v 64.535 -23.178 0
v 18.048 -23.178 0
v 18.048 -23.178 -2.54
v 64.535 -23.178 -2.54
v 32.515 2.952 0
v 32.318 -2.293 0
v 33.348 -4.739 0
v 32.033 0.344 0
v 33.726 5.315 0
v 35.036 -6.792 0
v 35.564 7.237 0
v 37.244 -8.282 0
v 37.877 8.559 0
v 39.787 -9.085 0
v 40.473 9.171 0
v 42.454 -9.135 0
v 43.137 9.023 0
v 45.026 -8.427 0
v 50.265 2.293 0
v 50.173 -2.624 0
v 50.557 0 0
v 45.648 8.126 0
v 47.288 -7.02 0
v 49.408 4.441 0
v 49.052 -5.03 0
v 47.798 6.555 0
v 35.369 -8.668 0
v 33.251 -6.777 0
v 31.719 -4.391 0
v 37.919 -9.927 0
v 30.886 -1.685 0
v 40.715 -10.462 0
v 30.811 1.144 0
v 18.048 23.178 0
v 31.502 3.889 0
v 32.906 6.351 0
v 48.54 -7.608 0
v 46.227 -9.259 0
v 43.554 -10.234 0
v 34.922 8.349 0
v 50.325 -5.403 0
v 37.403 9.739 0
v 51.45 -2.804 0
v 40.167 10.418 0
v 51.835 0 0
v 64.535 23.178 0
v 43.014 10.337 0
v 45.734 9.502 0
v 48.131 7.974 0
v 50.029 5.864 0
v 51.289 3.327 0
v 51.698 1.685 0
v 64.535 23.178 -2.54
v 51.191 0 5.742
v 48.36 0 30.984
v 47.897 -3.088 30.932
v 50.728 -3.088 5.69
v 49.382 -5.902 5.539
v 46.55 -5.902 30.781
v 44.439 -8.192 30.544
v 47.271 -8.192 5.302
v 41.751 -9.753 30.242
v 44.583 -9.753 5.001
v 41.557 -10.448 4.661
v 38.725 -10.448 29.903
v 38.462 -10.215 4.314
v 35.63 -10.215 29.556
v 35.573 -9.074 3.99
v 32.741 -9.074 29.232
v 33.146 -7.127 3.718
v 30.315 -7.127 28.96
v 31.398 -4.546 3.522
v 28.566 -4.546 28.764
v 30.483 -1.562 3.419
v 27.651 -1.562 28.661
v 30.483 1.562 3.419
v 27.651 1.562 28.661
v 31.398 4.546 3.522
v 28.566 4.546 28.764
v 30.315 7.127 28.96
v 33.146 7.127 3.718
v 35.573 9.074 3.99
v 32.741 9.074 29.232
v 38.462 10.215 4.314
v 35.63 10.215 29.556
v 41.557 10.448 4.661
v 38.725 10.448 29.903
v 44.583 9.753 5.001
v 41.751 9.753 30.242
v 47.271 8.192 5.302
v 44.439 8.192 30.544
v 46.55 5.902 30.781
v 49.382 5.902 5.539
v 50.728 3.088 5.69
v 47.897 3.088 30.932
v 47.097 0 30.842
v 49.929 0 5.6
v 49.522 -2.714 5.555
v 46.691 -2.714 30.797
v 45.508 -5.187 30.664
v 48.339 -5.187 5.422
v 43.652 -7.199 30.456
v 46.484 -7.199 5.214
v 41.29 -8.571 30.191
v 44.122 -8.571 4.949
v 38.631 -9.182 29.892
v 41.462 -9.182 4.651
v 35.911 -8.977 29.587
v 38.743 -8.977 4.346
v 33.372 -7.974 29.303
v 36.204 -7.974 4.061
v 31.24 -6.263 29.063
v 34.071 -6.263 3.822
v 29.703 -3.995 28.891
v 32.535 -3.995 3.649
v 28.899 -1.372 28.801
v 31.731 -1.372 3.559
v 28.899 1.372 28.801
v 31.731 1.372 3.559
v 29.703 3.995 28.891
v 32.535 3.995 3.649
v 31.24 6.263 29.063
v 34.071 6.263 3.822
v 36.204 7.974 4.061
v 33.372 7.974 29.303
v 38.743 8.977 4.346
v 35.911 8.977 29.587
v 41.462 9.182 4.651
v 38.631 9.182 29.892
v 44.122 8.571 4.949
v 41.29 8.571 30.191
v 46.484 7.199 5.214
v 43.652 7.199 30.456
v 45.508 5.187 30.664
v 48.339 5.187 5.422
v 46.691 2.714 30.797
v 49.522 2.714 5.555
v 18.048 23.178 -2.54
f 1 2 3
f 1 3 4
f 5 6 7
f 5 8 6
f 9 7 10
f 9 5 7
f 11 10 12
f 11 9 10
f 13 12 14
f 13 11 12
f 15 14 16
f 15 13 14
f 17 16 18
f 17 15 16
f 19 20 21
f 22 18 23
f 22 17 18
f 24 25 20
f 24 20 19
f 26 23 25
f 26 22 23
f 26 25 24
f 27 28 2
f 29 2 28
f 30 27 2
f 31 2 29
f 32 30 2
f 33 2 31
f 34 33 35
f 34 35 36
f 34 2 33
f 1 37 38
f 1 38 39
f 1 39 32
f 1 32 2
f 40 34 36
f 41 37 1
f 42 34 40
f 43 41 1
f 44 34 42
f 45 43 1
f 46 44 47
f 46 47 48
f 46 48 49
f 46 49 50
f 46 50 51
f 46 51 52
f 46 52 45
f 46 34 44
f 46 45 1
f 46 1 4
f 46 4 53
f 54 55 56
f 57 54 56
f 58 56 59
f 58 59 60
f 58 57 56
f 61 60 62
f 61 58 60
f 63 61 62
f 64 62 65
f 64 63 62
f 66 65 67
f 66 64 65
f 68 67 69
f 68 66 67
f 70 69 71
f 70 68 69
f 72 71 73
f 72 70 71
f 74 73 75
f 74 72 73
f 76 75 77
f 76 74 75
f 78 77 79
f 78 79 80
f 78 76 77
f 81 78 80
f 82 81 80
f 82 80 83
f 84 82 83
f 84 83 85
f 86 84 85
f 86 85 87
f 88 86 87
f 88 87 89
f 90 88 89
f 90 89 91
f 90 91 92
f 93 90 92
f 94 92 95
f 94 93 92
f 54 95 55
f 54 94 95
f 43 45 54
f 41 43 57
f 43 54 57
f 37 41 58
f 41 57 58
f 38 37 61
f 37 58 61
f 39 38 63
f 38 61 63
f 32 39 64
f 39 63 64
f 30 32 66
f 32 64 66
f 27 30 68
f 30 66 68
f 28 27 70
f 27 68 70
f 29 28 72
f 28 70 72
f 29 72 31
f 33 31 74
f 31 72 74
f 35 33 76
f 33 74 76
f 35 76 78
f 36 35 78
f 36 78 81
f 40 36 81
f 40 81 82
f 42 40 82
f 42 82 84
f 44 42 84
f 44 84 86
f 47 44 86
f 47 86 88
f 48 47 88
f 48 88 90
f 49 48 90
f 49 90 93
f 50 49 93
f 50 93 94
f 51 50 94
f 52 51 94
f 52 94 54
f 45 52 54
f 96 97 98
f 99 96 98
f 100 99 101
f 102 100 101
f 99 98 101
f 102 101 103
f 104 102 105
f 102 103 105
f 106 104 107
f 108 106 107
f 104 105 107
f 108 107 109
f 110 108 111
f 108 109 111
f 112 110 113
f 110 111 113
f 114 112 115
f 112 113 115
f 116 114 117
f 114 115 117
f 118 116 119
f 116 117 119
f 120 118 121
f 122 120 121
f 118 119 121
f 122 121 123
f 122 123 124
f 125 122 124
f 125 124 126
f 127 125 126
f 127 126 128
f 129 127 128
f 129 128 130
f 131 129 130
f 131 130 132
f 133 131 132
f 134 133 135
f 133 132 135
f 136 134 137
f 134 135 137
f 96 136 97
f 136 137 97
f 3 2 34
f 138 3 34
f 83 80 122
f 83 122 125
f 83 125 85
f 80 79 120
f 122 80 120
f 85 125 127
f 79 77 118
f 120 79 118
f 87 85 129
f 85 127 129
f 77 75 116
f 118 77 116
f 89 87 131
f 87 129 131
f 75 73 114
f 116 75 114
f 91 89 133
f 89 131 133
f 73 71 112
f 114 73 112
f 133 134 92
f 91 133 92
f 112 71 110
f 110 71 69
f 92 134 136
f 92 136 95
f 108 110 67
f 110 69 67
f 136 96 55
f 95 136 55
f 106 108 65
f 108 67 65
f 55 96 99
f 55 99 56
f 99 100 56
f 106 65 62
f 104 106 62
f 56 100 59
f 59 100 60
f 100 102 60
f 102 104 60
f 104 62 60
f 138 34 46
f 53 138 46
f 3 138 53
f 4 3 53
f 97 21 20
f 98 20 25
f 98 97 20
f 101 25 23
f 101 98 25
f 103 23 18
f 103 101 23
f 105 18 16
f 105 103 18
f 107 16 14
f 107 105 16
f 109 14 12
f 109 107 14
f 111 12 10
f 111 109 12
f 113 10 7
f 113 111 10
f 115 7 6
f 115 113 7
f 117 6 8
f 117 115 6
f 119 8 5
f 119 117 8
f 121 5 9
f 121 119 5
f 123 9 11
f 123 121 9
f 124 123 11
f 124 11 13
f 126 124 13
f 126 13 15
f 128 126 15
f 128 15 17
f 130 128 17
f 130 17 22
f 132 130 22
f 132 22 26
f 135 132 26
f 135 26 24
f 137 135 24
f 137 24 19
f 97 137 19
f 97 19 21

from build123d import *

# Parameters (mm, degrees)
F2_R     = 10.4775
F2_R_2   = 9.2075
F3_DEPTH = 25.4
F4_DEPTH = 25.4
F5_W     = 41.00275971
F5_H     = 25.6858672947
F6_DEPTH = 127
F7_W     = 46.4864122256
F7_H     = 46.355
F8_DEPTH = 2.54


with BuildPart() as f3:
    # F2 (on line) → F3 (new body)
    with BuildSketch(Plane(origin=(0, 0, 0), x_dir=(0.9937679192, 0, 0.1114689322), z_dir=(0.1114689322, 0, -0.9937679192))):
        with Locations((41.0343617785, 0)):
            Circle(F2_R)
        with Locations((41.0343617785, 0)):
            Circle(F2_R_2, mode=Mode.SUBTRACT)
    extrude(amount=-F3_DEPTH)

    # F4 (add): a face of the model
    f4_faces = [f3.faces().sort_by_distance(p)[0] for p in [
        (30.6609305302, 0, 3.4391743995),
    ]]
    extrude(f4_faces, amount=F4_DEPTH)

    # F5 (on Front) → F6 (cut, symmetric)
    with BuildSketch(Plane.XZ):
        with Locations((39.3967321143, -12.8429336473)):
            Rectangle(F5_W, F5_H)
    extrude(amount=F6_DEPTH, both=True, mode=Mode.SUBTRACT)

    # F7 (on Top) → F8 (join)
    with BuildSketch(Plane.XY):
        with Locations((41.2916949595, 0)):
            Rectangle(F7_W, F7_H)
    extrude(amount=-F8_DEPTH)


solid = f3.part
